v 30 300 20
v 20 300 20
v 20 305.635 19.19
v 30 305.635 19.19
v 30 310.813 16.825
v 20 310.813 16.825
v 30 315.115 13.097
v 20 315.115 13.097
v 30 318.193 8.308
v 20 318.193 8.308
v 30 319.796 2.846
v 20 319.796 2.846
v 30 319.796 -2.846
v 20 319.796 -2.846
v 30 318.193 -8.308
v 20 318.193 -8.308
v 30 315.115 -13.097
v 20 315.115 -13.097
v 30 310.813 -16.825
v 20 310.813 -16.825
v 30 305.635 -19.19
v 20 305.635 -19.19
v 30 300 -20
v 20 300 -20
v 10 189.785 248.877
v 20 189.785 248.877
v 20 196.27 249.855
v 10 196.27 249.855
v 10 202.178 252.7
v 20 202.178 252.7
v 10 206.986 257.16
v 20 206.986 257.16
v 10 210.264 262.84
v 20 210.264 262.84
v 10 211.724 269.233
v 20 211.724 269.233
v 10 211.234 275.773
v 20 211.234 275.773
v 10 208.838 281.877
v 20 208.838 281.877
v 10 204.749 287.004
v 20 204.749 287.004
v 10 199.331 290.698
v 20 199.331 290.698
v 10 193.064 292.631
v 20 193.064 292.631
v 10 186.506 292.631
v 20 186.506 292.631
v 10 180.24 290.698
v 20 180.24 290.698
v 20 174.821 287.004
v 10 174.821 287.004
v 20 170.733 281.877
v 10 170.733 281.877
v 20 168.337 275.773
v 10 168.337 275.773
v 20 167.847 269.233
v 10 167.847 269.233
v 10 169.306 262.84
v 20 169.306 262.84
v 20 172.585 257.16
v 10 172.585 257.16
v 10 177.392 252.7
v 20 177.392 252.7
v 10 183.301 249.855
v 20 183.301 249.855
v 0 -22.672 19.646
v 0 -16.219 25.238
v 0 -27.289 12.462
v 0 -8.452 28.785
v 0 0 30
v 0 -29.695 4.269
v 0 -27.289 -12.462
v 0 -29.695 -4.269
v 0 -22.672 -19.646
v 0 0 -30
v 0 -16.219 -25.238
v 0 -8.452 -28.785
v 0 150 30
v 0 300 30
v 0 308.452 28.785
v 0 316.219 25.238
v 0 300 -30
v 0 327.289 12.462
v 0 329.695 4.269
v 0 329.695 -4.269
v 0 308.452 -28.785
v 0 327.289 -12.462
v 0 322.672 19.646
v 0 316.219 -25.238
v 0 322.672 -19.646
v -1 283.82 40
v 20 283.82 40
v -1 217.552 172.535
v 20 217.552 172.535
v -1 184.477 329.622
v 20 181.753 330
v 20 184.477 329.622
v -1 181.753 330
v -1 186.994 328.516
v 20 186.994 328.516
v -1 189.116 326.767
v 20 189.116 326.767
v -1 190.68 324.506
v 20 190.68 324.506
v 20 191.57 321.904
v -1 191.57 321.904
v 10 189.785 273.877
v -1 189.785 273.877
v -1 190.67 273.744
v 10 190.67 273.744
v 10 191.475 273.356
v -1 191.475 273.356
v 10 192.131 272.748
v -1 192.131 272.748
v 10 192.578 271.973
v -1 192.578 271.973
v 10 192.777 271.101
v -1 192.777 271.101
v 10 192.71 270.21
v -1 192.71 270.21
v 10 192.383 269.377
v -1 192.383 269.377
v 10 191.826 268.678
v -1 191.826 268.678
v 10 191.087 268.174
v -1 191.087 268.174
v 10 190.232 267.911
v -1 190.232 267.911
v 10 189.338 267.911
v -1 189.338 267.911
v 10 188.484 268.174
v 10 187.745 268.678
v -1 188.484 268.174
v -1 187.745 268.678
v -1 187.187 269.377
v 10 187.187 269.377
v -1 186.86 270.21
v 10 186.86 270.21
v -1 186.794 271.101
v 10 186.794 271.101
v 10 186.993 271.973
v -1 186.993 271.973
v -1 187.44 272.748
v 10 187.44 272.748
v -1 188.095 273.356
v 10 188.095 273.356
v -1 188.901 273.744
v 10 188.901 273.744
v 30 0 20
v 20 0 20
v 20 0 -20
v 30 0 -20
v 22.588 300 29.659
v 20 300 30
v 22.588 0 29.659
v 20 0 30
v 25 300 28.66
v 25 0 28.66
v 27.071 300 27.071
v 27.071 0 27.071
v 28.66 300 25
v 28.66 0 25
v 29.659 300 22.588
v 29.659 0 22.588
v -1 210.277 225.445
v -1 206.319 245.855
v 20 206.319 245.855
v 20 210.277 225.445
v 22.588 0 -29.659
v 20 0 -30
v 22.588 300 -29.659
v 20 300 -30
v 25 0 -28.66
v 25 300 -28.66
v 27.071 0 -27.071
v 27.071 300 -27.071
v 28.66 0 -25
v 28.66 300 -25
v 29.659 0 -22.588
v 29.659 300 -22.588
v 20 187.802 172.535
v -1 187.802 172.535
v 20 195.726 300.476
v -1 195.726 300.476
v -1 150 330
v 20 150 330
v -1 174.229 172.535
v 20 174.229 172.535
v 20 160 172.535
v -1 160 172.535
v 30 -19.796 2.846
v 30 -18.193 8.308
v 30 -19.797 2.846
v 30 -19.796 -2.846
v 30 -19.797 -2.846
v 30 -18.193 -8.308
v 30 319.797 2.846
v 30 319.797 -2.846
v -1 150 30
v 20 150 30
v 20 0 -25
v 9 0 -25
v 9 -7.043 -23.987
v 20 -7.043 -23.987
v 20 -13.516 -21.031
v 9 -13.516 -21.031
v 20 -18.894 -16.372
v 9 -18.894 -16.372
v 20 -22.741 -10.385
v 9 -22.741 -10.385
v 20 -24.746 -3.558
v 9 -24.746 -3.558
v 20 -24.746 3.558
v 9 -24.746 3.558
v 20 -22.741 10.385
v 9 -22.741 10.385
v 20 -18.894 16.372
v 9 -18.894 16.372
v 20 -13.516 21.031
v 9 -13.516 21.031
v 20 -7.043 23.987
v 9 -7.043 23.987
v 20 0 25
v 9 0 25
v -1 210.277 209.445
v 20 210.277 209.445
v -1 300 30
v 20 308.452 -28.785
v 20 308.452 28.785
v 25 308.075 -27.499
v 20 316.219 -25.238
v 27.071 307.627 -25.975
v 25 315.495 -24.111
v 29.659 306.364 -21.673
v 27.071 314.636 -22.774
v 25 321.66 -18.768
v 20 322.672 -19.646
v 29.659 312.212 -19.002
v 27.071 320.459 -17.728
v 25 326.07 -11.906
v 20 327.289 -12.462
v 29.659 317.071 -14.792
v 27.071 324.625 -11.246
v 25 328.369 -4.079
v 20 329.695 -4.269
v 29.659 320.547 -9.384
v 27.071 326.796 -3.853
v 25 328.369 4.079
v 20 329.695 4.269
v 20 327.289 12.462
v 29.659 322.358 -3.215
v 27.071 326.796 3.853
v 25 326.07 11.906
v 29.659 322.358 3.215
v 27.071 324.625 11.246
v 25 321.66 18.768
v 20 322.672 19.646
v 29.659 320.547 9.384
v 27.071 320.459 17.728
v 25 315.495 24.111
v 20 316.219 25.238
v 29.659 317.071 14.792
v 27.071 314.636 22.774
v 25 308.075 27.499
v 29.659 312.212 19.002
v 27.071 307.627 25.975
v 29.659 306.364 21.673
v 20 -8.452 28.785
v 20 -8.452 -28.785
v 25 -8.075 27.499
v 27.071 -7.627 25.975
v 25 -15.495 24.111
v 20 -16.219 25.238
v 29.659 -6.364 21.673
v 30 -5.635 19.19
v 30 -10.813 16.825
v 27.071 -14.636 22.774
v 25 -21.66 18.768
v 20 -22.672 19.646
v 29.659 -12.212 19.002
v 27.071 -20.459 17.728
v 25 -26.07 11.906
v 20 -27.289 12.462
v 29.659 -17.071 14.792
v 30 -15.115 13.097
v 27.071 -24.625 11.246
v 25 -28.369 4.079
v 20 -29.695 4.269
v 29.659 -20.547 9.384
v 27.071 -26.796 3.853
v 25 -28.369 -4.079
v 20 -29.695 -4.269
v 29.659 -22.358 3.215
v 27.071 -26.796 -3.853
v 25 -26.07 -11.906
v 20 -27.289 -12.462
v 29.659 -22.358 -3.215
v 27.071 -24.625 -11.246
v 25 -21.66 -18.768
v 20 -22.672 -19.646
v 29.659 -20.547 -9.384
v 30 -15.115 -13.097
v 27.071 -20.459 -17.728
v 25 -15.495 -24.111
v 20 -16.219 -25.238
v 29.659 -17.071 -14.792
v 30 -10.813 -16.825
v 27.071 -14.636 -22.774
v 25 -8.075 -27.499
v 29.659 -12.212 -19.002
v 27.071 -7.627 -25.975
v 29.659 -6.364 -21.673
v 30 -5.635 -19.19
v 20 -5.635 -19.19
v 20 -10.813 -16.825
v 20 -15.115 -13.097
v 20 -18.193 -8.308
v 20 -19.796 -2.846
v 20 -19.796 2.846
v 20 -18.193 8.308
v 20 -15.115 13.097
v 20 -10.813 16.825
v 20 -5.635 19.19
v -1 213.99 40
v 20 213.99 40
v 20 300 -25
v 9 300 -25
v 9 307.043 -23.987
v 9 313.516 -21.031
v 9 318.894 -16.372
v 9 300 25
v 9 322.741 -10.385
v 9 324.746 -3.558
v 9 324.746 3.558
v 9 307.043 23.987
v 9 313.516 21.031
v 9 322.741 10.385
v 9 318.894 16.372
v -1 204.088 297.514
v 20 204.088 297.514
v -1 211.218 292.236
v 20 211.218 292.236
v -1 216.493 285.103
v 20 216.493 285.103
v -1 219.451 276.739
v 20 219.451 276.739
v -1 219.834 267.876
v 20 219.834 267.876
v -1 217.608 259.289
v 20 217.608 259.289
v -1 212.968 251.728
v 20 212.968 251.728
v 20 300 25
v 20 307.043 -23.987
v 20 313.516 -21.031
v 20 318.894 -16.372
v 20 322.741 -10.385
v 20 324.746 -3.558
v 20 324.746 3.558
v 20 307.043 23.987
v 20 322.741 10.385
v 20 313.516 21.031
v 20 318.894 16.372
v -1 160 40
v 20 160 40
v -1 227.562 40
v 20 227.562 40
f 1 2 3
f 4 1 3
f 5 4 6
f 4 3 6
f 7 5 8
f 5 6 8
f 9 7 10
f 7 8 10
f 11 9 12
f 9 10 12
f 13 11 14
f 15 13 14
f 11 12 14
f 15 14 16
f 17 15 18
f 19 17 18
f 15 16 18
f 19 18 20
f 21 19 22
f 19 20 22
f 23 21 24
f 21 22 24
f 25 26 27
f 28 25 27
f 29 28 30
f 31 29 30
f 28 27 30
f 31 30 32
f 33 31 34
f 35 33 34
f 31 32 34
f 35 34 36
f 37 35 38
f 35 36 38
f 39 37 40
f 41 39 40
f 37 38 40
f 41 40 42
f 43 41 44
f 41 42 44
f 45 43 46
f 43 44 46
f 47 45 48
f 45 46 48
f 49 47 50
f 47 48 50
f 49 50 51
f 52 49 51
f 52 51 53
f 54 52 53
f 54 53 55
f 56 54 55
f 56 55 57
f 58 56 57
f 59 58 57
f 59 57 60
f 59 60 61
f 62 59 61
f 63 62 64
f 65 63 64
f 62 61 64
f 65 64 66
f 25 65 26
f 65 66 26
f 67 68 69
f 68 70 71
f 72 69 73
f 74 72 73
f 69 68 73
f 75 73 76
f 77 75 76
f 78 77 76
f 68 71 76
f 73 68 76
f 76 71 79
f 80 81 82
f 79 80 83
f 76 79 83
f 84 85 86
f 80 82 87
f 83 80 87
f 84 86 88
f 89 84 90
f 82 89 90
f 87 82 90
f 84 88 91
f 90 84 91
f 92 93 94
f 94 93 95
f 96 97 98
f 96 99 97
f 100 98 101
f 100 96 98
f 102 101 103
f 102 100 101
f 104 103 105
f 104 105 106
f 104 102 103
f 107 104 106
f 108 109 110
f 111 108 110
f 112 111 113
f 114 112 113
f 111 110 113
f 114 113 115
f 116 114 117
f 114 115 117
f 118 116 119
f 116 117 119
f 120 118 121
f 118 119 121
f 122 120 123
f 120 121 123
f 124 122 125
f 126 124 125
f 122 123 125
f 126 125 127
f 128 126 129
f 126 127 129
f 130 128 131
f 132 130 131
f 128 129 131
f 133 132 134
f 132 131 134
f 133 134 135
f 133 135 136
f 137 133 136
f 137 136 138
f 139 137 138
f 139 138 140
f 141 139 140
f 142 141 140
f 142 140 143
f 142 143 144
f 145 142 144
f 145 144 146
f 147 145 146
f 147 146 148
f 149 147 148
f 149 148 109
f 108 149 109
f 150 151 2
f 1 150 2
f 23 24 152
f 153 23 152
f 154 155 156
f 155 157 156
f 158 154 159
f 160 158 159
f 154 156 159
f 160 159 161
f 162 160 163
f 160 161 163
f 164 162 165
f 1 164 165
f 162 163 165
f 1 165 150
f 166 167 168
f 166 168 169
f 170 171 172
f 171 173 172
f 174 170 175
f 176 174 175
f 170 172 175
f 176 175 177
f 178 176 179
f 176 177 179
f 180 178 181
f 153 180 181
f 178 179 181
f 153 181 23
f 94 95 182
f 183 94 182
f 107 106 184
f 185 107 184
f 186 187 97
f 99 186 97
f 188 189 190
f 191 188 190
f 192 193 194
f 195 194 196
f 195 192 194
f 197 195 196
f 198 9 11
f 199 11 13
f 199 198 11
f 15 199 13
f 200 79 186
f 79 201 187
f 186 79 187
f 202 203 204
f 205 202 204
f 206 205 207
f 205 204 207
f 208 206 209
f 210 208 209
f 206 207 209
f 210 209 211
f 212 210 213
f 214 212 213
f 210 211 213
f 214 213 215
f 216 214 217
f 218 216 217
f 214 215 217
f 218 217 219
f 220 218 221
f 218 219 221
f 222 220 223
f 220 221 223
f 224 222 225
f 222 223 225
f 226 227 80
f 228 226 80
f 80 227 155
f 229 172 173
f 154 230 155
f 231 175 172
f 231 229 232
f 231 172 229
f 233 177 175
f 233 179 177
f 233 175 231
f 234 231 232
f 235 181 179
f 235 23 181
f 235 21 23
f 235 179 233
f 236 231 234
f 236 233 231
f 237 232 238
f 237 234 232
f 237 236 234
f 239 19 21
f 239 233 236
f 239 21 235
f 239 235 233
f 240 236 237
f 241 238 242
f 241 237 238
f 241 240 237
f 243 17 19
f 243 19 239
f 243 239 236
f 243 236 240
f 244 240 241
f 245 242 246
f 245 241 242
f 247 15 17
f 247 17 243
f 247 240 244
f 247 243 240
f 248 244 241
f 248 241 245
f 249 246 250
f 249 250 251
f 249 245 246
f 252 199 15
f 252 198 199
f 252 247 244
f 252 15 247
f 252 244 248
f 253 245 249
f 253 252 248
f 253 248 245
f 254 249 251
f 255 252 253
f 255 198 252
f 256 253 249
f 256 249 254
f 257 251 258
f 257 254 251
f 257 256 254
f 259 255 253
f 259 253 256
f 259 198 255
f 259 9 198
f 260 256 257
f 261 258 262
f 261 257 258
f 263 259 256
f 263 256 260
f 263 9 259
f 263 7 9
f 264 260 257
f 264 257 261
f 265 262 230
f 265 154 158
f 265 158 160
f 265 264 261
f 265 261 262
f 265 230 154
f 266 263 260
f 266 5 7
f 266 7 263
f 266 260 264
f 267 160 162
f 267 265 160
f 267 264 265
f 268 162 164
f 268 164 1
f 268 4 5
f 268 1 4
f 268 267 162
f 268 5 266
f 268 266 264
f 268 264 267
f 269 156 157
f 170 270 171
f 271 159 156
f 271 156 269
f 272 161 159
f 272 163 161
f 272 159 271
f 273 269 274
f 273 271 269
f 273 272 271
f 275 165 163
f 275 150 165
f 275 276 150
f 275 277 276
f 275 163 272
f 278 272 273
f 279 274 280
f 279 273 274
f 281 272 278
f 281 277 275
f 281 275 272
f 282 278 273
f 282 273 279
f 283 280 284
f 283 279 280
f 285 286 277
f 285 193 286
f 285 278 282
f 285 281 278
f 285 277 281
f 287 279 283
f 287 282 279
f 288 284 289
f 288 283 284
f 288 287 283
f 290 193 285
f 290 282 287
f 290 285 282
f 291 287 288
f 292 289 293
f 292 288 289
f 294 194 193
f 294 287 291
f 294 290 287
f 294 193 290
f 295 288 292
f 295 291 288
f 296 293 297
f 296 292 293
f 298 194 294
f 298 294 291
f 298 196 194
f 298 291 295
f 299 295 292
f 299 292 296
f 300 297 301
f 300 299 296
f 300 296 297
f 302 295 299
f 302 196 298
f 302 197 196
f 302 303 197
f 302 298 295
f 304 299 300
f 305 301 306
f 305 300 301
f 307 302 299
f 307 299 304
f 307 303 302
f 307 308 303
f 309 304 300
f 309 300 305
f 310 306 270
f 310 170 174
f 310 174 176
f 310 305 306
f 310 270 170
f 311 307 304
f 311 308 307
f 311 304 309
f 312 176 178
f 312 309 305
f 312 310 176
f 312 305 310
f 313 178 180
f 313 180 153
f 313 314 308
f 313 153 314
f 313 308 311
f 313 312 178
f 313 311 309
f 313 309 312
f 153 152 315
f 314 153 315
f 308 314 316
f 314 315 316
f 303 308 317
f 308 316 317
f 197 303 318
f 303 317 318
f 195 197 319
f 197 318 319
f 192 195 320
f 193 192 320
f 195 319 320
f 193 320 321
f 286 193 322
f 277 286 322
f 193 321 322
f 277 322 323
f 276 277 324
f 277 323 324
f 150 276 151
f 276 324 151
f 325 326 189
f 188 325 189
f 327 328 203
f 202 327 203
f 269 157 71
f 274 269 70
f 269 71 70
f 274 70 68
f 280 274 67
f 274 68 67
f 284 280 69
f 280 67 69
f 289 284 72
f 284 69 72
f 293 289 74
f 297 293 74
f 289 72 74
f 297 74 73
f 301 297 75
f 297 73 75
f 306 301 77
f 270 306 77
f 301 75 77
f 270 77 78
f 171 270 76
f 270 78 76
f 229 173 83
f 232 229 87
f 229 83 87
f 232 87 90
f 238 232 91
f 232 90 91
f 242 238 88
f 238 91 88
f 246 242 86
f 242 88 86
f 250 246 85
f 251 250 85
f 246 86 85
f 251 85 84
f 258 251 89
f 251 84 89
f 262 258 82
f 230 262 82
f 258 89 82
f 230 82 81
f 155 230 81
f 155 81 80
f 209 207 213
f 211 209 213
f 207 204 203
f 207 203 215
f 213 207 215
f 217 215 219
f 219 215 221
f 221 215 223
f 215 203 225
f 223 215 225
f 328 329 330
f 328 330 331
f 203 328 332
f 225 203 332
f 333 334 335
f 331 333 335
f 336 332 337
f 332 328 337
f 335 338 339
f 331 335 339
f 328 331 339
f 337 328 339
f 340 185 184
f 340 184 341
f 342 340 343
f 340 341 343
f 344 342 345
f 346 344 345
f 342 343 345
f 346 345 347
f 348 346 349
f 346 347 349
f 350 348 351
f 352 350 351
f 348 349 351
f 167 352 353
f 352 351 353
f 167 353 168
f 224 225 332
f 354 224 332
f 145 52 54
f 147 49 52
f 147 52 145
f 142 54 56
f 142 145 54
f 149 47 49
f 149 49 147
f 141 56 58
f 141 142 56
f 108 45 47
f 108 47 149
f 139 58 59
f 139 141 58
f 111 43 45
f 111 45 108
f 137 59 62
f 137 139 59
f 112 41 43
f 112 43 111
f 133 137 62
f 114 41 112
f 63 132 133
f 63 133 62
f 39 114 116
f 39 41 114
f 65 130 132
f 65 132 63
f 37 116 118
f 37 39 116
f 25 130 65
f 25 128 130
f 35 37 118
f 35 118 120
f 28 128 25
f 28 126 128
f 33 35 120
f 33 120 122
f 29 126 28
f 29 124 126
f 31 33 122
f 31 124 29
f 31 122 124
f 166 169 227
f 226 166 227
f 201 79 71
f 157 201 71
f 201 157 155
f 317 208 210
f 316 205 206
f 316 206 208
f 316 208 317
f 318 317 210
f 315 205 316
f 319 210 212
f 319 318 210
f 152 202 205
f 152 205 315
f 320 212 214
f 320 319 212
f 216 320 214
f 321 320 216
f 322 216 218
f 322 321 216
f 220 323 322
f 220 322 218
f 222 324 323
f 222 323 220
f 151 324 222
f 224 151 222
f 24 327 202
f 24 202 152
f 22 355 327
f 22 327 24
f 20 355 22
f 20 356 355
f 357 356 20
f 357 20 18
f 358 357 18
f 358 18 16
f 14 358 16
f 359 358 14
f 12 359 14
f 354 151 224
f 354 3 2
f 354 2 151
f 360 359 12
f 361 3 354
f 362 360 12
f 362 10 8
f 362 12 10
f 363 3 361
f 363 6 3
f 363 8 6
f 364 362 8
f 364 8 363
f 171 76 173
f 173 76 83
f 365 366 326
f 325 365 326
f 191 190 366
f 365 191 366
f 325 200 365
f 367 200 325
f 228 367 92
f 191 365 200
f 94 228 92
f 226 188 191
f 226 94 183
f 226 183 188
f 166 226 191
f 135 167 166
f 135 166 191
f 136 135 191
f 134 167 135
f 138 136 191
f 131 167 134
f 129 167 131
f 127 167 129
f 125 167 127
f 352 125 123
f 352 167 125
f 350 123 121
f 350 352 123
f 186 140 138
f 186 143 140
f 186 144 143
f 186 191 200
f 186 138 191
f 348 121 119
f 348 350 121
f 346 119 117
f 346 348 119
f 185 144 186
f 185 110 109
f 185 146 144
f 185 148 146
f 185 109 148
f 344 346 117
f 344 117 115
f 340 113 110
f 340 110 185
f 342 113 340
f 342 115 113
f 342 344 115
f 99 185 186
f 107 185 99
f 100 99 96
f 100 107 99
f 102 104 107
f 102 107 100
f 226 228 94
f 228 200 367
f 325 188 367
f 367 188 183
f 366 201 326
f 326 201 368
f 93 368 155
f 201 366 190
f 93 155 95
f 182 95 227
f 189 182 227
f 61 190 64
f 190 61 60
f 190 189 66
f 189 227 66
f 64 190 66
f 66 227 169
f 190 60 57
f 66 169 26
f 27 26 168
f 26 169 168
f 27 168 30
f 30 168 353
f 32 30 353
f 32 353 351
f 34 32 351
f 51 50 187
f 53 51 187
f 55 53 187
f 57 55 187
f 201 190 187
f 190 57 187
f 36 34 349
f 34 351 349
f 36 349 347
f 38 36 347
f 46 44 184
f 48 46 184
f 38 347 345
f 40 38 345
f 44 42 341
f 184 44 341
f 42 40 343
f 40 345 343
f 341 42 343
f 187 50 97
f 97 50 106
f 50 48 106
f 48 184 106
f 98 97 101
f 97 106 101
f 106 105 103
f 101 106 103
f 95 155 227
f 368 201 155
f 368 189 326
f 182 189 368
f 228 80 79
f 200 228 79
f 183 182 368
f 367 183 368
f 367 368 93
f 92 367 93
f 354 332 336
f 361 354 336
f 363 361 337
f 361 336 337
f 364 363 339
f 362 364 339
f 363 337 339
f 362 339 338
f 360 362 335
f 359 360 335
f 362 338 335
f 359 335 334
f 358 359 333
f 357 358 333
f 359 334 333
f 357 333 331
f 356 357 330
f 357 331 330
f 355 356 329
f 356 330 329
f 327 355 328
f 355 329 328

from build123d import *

# Parameters (mm, degrees)
BOSS_EXTRUDE3_DEPTH     = 10
BOSS_EXTRUDE4_DEPTH     = 30
CUT_EXTRUDE1_DEPTH      = 10
CUT_EXTRUDE1_DEPTH_BACK = 1
FILLET1_R               = 10
BOSS_EXTRUDE5_DEPTH     = 21
CUT_EXTRUDE2_DEPTH      = 21
FILLET2_R               = 10
SKETCH15_R              = 3
CUT_EXTRUDE3_DEPTH      = 21
SKETCH16_R              = 22
CUT_EXTRUDE4_DEPTH      = 10


with BuildPart() as part:
    # Sketch1 → Boss-Extrude3 (new body)
    with BuildSketch(Plane(origin=(0, 0, 0), x_dir=(0, 0, -1), z_dir=(1, 0, 0))):
        with BuildLine():
            Line((-20, 0), (-20, 300))
            ThreePointArc((-20, 300), (0, 320), (20, 300))
            Line((20, 300), (20, 0))
            ThreePointArc((20, 0), (0, -20), (-20, 0))
        make_face()
    extrude(amount=BOSS_EXTRUDE3_DEPTH)

    # Sketch1<5> → Boss-Extrude4 (add)
    with BuildSketch(Plane(origin=(0, 0, 0), x_dir=(0, 0, -1), z_dir=(1, 0, 0))):
        with BuildLine():
            Line((-30, 300), (-30, 0))
            ThreePointArc((-30, 0), (0, -30), (30, 0))
            Line((30, 0), (30, 300))
            ThreePointArc((30, 300), (0, 330), (-30, 300))
        make_face()
        with BuildLine():
            Line((-20, 0), (-20, 300))
            ThreePointArc((-20, 300), (0, 320), (20, 300))
            Line((20, 300), (20, 0))
            ThreePointArc((20, 0), (0, -20), (-20, 0))
        make_face(mode=Mode.SUBTRACT)
    extrude(amount=BOSS_EXTRUDE4_DEPTH)

    # Sketch2 → Cut-Extrude1 (cut, two sides: drawn at the far end of the back side and taken through both)
    with BuildSketch(Plane(origin=(10, 0, 0), x_dir=(0, 0, -1), z_dir=(1, 0, 0)).offset(-CUT_EXTRUDE1_DEPTH_BACK)):
        with BuildLine():
            Line((-25, 0), (-25, 300))
            ThreePointArc((-25, 300), (0, 325), (25, 300))
            Line((25, 300), (25, 0))
            ThreePointArc((25, 0), (0, -25), (-25, 0))
        make_face()
    extrude(amount=CUT_EXTRUDE1_DEPTH + CUT_EXTRUDE1_DEPTH_BACK, mode=Mode.SUBTRACT)

    # Fillet1
    fillet1_edges = [part.edges().sort_by_distance(p)[0] for p in [
        (30, 330, 0),
        (30, 150, 30),
        (30, -30, 0),
        (30, 150, -30),
    ]]
    fillet(fillet1_edges, radius=FILLET1_R - 0.0001)  # a hair under: the kernel refuses the full size

    # Sketch4 → Boss-Extrude5 (add)
    with BuildSketch(Plane.ZY.offset(-20)):
        with BuildLine():
            Line((30, 300), (30, 150))
            Line((30, 150), (330, 150))
            Line((330, 150), (330, 190))
            Line((330, 190), (300.476136934, 195.7258523))
            ThreePointArc((300.476136934, 195.7258523), (276.739397408, 219.4512428), (245.854526043, 206.319156964))
            Line((245.854526043, 206.319156964), (225.44540351, 210.277298245))
            Line((225.44540351, 210.277298245), (209.44540351, 210.277298245))
            Line((209.44540351, 210.277298245), (30, 300))
        make_face()
    extrude(amount=BOSS_EXTRUDE5_DEPTH)

    # Sketch6 → Cut-Extrude2 (cut)
    with BuildSketch(Plane(origin=(20, 0, 0), x_dir=(0, 0, -1), z_dir=(1, 0, 0))):
        Polygon((-40, 160), (-40, 213.989666216), (-172.534869505, 174.229205364), (-172.534869505, 160), align=None)
        Polygon((-40, 283.819660113), (-172.534869505, 217.55222536), (-172.534869505, 187.801603826), (-40, 227.562064677), align=None)
    extrude(amount=-CUT_EXTRUDE2_DEPTH, mode=Mode.SUBTRACT)

    # Fillet2
    fillet2_edges = [part.edges().sort_by_distance(p)[0] for p in [
        (9.5, 190, 330),
    ]]
    fillet(fillet2_edges, radius=FILLET2_R)

    # Sketch15 → Cut-Extrude3 (cut)
    with BuildSketch(Plane.ZY.offset(1)):
        with Locations((270.877121852, 189.785242032)):
            Circle(SKETCH15_R)
    extrude(amount=-CUT_EXTRUDE3_DEPTH, mode=Mode.SUBTRACT)

    # Sketch16 → Cut-Extrude4 (cut)
    with BuildSketch(Plane(origin=(20, 0, 0), x_dir=(0, 0, -1), z_dir=(1, 0, 0))):
        with Locations((-270.877121852, 189.785242032)):
            Circle(SKETCH16_R)
    extrude(amount=-CUT_EXTRUDE4_DEPTH, mode=Mode.SUBTRACT)


solid = part.part
